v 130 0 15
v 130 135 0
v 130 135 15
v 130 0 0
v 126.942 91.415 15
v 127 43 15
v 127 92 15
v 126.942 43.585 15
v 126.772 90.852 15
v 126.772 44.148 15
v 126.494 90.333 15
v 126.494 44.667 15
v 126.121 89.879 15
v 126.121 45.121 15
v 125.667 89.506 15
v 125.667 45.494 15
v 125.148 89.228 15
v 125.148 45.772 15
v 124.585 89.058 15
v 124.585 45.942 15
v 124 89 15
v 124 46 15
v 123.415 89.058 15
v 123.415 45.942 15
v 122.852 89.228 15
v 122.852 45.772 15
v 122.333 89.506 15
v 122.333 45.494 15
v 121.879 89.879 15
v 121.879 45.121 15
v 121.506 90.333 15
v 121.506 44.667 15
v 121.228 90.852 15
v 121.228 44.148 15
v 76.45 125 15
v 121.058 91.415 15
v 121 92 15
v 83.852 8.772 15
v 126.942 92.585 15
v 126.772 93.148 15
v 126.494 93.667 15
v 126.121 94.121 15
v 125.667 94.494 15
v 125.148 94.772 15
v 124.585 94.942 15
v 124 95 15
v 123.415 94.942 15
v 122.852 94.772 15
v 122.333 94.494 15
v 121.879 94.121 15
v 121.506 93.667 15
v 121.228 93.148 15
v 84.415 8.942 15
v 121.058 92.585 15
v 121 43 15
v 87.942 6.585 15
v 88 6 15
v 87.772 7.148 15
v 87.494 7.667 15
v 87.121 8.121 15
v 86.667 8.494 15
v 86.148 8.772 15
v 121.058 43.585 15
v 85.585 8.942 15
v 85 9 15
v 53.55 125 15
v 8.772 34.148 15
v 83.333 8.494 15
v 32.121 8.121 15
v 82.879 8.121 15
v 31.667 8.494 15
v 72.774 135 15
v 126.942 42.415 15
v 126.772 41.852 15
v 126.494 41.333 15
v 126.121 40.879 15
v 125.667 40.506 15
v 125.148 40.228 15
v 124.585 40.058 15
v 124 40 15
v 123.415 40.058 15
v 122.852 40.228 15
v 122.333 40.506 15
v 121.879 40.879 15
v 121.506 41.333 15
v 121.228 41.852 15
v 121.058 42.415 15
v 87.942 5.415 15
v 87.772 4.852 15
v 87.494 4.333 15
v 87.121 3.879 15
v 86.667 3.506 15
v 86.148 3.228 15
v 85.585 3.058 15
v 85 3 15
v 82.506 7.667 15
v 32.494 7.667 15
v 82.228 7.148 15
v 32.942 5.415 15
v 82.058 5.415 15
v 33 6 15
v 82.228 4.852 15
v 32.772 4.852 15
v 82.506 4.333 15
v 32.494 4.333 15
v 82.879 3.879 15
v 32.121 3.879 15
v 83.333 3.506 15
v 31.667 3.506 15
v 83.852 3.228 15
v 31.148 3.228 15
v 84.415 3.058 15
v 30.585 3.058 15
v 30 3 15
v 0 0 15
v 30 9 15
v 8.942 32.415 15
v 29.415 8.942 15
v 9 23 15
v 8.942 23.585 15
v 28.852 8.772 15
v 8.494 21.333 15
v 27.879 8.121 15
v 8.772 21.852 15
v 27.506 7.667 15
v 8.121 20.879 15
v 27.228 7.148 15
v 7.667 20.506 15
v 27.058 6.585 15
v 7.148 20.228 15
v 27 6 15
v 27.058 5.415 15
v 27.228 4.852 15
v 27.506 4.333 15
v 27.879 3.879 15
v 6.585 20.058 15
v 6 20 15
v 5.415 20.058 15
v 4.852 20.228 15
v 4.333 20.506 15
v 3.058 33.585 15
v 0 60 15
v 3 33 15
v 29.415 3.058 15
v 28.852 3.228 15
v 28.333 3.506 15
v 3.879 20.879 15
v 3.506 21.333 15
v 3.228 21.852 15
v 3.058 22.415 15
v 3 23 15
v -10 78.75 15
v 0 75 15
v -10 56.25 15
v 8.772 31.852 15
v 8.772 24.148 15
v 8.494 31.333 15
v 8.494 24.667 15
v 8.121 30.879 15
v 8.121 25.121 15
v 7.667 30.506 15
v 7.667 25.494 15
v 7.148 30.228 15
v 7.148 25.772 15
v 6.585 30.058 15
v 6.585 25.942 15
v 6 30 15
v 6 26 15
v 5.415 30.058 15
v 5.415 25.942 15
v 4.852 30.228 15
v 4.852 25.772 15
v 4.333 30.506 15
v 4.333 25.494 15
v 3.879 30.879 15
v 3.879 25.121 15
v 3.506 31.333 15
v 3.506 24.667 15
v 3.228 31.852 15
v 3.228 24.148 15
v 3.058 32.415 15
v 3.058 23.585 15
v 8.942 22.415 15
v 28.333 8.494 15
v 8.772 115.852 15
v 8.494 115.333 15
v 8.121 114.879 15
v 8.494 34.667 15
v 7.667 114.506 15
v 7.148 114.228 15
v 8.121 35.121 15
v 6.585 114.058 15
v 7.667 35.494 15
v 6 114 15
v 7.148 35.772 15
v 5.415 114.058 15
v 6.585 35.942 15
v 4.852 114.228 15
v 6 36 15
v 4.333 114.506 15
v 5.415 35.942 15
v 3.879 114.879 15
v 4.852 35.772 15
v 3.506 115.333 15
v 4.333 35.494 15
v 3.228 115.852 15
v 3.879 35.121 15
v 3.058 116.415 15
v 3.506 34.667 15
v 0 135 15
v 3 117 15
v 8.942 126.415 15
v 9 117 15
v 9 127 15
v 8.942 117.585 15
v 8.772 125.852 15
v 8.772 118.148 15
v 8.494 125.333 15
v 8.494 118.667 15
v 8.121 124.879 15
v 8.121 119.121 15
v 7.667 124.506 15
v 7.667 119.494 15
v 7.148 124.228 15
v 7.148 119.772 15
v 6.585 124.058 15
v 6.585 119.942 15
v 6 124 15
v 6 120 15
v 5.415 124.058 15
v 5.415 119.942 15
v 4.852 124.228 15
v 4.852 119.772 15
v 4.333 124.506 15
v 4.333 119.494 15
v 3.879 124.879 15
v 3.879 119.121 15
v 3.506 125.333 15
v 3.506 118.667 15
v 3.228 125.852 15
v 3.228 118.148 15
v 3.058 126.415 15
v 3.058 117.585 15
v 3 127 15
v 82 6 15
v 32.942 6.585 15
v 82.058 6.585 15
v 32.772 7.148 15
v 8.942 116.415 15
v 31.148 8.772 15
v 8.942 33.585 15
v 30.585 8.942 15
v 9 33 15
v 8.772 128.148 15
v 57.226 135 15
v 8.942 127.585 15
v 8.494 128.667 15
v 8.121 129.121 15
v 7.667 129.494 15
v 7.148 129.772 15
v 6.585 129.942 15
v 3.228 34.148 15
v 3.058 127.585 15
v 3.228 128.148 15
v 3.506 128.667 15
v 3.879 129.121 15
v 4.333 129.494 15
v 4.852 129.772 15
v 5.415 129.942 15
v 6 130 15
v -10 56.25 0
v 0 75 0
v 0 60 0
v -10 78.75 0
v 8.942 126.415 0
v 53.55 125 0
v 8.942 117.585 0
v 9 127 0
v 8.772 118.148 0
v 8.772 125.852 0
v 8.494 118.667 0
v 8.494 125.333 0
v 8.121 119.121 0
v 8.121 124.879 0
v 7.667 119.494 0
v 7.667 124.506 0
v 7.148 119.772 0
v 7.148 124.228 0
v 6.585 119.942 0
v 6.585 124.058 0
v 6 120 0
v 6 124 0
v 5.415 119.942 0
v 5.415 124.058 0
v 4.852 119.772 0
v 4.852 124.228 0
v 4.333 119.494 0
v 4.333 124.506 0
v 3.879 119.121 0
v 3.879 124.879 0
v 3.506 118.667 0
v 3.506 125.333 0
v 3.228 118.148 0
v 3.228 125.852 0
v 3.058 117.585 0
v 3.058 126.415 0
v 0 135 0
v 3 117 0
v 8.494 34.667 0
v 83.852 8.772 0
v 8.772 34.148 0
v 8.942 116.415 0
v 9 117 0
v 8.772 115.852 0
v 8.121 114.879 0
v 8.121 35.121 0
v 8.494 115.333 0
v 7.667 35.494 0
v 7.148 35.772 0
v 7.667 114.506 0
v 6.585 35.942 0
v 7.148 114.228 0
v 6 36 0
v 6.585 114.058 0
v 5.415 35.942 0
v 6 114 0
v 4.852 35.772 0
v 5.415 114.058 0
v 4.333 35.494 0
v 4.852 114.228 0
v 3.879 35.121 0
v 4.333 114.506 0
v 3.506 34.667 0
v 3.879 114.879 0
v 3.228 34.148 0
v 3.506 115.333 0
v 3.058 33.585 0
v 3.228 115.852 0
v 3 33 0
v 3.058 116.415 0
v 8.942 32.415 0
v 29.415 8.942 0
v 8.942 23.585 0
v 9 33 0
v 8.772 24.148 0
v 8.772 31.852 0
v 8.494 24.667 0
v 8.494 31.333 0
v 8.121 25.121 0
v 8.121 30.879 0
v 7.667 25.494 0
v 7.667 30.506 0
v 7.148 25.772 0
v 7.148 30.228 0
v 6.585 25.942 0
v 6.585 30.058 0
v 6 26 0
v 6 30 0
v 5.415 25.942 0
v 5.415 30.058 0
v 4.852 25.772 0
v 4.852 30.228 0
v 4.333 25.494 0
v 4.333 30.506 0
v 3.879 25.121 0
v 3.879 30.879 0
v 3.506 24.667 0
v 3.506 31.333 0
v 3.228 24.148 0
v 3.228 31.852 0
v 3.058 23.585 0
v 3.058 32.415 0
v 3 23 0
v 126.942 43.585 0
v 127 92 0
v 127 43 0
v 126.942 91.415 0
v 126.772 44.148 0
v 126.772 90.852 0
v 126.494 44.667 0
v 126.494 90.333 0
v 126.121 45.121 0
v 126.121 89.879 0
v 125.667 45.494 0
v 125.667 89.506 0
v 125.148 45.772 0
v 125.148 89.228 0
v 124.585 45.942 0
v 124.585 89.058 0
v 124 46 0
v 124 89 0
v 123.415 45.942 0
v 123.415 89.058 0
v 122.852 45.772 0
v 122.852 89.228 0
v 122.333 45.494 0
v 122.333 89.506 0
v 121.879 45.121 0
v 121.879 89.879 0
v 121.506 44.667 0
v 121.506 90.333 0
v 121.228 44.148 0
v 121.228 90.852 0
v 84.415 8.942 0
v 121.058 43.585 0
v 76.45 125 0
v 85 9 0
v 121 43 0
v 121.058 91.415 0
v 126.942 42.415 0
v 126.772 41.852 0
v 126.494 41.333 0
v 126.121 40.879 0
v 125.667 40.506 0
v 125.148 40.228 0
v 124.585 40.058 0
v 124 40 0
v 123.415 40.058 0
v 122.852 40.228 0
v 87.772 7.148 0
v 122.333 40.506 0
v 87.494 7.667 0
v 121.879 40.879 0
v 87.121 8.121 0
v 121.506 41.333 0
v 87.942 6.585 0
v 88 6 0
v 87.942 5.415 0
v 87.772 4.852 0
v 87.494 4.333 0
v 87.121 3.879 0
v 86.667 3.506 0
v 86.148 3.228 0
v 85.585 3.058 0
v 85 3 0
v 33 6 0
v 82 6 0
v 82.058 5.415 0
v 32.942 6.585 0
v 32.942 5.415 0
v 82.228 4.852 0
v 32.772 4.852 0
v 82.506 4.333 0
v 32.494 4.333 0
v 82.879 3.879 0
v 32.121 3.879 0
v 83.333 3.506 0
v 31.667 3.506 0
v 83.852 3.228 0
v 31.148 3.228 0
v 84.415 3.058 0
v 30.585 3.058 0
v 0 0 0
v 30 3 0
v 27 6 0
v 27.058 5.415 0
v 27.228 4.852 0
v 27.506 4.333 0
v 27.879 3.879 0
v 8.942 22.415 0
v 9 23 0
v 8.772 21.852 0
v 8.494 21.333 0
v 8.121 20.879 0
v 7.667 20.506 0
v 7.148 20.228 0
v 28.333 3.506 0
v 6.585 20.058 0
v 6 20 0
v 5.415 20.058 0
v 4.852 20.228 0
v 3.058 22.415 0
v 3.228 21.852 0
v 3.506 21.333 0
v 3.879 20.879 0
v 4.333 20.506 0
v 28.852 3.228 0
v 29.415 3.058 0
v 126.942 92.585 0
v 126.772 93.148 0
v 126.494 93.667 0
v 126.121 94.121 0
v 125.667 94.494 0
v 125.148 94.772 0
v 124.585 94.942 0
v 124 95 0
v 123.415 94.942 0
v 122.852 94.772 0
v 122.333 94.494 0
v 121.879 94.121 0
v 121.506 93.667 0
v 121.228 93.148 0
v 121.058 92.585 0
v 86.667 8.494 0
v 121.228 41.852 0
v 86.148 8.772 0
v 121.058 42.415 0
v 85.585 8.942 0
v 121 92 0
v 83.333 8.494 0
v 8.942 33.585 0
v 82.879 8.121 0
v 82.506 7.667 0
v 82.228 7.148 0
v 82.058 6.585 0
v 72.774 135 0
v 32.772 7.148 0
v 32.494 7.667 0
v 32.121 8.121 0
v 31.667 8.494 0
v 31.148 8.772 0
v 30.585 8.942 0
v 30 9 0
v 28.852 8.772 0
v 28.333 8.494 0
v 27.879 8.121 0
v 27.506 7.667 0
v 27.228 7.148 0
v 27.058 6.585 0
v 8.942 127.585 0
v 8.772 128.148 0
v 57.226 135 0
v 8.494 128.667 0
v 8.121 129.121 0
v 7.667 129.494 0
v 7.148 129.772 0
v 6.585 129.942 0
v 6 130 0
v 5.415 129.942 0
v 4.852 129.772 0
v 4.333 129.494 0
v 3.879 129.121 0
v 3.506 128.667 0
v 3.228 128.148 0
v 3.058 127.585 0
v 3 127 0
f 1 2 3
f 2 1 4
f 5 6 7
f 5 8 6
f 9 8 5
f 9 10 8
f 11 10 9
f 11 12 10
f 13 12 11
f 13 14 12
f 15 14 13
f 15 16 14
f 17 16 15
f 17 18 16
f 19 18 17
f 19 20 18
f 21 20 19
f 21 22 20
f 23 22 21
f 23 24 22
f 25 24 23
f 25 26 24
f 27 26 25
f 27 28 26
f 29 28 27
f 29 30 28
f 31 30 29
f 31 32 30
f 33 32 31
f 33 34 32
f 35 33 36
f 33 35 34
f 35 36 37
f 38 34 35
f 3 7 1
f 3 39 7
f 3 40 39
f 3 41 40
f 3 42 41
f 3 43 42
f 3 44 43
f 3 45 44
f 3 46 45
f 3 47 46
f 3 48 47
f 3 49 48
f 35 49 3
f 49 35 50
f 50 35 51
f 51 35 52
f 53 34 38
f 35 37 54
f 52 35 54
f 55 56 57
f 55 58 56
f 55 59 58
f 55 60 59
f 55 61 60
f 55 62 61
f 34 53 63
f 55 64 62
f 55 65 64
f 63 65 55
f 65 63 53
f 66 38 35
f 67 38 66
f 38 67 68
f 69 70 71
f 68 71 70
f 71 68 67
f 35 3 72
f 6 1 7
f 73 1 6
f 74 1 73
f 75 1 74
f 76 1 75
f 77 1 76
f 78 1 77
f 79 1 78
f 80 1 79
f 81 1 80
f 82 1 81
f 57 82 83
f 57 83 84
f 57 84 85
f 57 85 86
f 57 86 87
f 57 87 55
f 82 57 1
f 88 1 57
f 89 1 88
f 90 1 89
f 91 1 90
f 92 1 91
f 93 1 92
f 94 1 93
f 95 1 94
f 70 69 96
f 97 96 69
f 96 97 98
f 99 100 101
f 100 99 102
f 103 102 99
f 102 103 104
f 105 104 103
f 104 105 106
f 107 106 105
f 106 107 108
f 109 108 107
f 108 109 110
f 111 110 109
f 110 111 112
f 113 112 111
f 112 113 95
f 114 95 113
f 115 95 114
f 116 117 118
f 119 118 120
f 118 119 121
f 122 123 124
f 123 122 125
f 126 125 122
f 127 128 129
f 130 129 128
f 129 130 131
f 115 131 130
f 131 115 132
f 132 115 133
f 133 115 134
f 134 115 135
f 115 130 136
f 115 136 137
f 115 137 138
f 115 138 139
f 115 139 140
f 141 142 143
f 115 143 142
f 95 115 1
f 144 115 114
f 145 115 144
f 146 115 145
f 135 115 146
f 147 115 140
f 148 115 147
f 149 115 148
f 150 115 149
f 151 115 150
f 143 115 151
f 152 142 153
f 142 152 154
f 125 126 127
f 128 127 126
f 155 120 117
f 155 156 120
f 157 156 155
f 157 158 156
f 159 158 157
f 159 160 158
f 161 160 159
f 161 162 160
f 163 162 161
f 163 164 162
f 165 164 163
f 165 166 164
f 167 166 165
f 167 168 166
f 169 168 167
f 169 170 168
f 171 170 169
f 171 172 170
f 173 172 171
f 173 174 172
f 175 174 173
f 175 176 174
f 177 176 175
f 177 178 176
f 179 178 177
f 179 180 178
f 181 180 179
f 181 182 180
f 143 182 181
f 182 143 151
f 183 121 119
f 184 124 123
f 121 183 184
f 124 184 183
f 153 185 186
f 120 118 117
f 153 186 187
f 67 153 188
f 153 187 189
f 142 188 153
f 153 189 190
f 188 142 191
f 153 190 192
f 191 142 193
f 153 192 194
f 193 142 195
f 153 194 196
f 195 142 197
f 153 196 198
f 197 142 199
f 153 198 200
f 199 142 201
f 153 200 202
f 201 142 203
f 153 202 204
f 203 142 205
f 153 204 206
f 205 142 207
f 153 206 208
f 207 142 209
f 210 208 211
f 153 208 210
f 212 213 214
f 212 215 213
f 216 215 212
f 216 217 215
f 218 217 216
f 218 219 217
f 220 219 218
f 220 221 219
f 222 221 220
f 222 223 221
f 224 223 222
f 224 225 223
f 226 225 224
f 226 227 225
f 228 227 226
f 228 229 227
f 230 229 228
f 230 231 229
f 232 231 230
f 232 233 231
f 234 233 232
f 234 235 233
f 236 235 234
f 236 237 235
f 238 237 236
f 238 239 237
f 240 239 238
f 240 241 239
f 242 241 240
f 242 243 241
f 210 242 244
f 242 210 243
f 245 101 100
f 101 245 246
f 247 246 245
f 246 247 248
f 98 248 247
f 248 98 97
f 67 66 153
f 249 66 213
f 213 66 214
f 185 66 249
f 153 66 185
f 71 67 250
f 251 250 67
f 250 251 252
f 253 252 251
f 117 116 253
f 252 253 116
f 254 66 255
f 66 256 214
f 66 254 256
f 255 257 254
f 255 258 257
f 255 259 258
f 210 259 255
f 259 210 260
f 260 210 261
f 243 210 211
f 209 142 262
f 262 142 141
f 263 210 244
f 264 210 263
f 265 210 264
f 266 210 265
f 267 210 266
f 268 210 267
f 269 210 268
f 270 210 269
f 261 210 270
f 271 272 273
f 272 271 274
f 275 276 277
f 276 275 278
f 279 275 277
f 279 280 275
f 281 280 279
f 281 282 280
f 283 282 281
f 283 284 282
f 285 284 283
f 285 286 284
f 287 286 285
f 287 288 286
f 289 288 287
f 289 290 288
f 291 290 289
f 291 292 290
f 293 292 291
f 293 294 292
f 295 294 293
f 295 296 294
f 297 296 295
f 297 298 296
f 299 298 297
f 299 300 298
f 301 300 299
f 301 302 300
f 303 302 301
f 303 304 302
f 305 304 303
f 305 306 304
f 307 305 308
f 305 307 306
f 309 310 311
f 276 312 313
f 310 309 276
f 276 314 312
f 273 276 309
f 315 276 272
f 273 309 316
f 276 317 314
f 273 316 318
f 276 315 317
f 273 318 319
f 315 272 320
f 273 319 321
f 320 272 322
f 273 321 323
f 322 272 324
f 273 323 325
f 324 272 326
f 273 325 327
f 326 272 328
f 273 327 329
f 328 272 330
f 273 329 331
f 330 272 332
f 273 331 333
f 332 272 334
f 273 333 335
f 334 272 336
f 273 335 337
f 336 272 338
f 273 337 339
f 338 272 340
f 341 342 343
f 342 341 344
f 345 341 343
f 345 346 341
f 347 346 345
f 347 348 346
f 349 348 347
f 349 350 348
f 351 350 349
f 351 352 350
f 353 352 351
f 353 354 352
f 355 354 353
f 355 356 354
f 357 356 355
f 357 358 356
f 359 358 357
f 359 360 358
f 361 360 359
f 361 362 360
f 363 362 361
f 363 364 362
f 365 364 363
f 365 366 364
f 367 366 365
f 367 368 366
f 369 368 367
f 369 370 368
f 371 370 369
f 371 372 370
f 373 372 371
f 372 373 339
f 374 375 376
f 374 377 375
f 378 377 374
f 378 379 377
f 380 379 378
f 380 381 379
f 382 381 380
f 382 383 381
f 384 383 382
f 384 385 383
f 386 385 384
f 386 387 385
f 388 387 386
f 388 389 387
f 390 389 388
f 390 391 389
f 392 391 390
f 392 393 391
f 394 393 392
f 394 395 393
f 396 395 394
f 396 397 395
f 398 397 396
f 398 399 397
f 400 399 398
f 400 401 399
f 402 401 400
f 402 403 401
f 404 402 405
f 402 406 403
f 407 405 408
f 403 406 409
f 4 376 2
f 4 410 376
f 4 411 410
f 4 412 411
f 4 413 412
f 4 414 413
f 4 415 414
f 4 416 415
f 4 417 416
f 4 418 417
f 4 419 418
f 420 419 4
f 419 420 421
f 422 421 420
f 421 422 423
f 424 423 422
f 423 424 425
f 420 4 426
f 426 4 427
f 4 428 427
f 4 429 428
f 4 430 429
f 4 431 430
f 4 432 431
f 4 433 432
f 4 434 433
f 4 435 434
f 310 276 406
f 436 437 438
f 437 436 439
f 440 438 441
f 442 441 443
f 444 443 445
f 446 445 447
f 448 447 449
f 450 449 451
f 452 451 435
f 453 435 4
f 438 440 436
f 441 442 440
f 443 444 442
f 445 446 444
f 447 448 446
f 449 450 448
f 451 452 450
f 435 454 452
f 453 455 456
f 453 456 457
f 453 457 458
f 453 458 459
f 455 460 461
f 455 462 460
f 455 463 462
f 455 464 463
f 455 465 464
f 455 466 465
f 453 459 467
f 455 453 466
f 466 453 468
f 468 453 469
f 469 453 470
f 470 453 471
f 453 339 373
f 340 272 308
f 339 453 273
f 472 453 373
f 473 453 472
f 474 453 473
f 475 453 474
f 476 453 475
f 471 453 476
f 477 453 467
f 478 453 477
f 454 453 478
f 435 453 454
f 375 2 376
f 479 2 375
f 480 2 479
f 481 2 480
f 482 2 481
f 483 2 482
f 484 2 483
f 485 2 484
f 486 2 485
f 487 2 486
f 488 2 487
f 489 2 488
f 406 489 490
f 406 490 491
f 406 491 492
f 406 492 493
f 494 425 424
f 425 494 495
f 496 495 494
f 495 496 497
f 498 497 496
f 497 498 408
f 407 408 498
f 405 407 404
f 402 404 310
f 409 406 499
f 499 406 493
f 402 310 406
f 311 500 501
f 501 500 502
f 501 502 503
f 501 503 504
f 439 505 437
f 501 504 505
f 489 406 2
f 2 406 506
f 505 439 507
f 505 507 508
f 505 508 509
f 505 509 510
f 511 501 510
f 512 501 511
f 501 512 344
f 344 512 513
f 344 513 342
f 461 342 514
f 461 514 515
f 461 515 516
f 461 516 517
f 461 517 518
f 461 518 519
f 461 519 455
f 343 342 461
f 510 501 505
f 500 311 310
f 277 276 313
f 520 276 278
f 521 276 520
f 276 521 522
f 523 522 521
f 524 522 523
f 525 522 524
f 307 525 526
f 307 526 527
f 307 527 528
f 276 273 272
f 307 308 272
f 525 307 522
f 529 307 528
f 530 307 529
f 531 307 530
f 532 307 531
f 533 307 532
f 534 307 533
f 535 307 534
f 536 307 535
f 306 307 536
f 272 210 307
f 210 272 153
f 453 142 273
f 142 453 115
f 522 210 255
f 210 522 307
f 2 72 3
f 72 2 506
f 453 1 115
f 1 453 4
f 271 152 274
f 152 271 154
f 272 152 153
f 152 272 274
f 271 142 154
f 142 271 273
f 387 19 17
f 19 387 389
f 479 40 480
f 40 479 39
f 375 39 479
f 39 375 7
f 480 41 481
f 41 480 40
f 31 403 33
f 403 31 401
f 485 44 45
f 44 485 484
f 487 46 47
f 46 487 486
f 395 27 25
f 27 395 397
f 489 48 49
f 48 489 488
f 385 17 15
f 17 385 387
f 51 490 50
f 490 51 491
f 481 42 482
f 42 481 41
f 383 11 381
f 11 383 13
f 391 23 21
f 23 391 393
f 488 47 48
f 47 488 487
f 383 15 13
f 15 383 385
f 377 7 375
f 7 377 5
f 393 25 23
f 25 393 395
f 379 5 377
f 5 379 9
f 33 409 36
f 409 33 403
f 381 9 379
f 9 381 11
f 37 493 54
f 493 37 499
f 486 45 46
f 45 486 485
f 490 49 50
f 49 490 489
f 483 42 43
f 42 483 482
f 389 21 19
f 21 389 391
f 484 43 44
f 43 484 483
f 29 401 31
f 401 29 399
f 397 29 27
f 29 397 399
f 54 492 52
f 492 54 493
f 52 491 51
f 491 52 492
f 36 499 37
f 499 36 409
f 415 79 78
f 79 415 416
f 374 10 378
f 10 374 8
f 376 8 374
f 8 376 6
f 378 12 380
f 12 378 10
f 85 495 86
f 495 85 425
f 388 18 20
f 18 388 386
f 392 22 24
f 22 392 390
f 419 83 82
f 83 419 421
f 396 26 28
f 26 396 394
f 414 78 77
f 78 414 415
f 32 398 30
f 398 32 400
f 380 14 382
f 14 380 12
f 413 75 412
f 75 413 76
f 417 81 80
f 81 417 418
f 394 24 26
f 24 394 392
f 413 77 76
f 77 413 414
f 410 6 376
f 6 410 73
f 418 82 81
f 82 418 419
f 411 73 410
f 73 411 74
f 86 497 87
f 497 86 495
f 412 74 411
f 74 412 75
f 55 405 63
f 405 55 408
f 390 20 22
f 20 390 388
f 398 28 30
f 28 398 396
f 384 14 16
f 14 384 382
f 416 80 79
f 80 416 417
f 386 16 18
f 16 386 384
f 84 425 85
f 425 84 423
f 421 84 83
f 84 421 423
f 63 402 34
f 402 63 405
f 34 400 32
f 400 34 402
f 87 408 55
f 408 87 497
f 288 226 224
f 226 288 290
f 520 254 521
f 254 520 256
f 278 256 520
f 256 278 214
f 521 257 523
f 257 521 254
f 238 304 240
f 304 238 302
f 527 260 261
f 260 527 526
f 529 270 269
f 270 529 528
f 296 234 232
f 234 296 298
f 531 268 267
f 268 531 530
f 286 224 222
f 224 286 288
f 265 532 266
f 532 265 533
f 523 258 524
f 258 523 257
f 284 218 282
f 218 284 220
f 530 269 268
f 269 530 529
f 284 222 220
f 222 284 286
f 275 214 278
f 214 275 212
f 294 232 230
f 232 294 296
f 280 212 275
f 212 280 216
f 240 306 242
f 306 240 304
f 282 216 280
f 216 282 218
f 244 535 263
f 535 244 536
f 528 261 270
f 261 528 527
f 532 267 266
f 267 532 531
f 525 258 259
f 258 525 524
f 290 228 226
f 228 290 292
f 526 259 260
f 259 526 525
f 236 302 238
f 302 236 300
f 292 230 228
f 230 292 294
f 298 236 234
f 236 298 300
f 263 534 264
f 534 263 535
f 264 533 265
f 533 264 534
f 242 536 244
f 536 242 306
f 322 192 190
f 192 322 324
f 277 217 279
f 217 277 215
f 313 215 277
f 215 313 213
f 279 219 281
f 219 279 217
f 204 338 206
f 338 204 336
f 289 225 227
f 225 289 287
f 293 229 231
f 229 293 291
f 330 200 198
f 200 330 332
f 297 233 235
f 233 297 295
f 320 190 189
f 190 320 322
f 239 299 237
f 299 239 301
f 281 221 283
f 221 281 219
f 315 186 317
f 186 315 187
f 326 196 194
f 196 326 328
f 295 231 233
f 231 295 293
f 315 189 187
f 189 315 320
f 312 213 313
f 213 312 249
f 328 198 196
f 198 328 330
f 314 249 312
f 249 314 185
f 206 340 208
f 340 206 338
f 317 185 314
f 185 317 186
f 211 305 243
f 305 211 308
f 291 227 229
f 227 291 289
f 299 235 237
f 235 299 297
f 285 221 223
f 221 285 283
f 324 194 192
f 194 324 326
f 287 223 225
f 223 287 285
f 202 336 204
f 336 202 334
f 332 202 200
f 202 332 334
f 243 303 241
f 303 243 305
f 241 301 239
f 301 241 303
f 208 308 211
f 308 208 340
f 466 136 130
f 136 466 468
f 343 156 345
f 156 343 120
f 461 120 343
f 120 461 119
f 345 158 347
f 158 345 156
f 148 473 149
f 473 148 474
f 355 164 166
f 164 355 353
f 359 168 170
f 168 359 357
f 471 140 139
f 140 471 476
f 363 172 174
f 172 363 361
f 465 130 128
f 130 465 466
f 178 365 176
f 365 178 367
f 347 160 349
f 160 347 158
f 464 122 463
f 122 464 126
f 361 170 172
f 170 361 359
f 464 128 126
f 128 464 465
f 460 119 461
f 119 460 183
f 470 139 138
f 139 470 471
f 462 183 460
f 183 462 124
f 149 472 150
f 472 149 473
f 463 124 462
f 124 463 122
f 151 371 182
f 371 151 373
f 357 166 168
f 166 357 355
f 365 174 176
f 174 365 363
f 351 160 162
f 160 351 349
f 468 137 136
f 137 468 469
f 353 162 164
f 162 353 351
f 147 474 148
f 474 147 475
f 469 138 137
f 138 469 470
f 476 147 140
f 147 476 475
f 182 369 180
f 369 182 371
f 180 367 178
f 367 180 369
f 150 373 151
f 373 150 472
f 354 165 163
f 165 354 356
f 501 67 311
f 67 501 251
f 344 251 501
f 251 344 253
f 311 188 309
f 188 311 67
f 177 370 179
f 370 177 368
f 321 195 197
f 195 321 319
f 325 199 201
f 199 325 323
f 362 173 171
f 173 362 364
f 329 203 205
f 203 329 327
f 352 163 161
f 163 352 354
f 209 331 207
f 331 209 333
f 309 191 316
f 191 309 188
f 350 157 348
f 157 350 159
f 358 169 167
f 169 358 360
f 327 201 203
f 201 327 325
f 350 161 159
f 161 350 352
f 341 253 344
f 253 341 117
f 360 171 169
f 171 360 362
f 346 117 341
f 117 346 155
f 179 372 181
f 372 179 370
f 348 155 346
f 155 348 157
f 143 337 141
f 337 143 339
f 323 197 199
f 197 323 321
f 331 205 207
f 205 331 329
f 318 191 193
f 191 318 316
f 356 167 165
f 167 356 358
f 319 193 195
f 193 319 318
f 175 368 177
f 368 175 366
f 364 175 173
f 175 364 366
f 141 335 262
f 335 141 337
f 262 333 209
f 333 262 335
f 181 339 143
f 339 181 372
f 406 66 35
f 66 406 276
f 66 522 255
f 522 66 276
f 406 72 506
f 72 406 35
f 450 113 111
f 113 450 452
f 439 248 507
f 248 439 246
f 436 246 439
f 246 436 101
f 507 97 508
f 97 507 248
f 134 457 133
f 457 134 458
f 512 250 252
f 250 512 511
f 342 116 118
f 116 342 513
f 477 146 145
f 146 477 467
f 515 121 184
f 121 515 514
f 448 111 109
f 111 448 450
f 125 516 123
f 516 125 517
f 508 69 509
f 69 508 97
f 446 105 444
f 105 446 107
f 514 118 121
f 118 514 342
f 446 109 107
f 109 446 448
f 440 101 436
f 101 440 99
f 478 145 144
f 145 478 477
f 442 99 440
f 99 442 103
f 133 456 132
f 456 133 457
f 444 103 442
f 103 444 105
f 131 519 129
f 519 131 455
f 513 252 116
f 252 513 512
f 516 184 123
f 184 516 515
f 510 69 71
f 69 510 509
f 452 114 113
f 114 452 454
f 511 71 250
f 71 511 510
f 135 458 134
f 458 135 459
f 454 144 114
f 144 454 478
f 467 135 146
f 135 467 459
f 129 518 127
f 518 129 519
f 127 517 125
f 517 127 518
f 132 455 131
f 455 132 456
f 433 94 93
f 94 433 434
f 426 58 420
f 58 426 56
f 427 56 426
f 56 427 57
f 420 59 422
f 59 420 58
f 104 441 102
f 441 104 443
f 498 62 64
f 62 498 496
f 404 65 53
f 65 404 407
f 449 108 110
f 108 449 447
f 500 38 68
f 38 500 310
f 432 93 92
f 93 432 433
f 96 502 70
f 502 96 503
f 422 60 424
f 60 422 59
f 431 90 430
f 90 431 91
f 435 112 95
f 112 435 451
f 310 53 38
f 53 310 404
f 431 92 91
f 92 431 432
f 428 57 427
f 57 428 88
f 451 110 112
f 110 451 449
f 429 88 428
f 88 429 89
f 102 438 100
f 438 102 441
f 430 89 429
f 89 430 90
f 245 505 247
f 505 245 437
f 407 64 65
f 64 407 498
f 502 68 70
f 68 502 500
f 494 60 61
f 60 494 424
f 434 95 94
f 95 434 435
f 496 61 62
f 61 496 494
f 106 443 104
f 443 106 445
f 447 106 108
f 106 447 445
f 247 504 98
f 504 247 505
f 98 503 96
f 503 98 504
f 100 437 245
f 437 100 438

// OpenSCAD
// --- PARAMETERS ---
// NOTE: All units are in mm
TILE_HEIGHT = 120;          // Interior height of each square tile
TILE_WIDTH = 100;           // Interior width of each square tile

backplate_thickness = 15;   // Thickness of backplate
wall_thickness = 15;        // Thickness of frame walls
wall_depth = 100;

div_peg_radius = 3;             // Radius of the divider pegs holes/pegs
div_height = 30;
div_peg_offset_x = (wall_thickness - 2 * div_peg_radius);           // Distance of divider pegs from the (left, right) edges
div_peg_distance = 10;          // Distance between divider peg pairs on tile
div_peg_offset_y = div_height/2 - div_peg_distance;          // Distance of divider pegs from the (top, bottom) edges


wall_peg_radius = 3;             // Radius of the wall pegs
wall_peg_offset_x = (wall_thickness - 2 * wall_peg_radius);           // Distance of wall pegs from the (left, right) edges
wall_peg_offset_y = 12;          // Distance of wall pegs from the (top, bottom) edges
wall_peg_distance = 55;          // Distance between wall peg pairs on tile

joint_width = 15;           // Width of the interlocking dovetail
joint_depth = 10;           // Depth of the interlocking joint
tolerance = 0.2;            // Tolerance for printing

/* [Piece Selector] */
// Options: "center", "top_left", "top_mid", "top_right", "mid_left", "mid_right", "bot_left", "bot_mid", "bot_right"
// Order of options below is IMPORTANT
// Note: This generates all the modular pieces for the mug shelf. There should be no need to modify the tile options matrix as all parts with exception of corners are designed to be infinitely tile-able to fit the desired dimension requirements.
TILE_OPTIONS = ["top_left", "top_mid", "top_right", 
                "mid_left", "center", "mid_right", 
                "bot_left", "bot_mid", "bot_right"];
tile_type = "bot_right";
tile_index = search([tile_type], TILE_OPTIONS);

module dovetail_male(is_socket = false) {
    t_adj = is_socket ? tolerance : 0;
    linear_extrude(backplate_thickness + (is_socket ? 2 : 0))
    polygon([
            [0, -t_adj], 
            [joint_depth + t_adj, -joint_width/4 - t_adj], 
            [joint_depth + t_adj, joint_width*1.25 + t_adj], 
            [0, joint_width + t_adj]]);
}

module tile_generator() {
    // Adjust tile dimensions depending on option to keep interior space consistent
    // Increase height for top and bottom rows, NOTE: top row should be the largest as it contains both a top and bottom wall
    tile_height = TILE_HEIGHT + (tile_index[0] < 3 ? 2 : 1) * wall_thickness;
    // Increase width for leftmost and rightmost columns
    tile_width = TILE_WIDTH + (tile_index[0] % 3 == 2 ? 2 : 1) * wall_thickness;
    
    difference () {
        union(){
            cube([tile_width, tile_height, backplate_thickness]);
            // Add Male Joints (Left and Bottom for logic)
            // Left joint (mid, right)
            if (tile_index[0] % 3 > 0) {
                 translate([0, tile_height/2 + joint_width/2, 0]) rotate([0,0,180]) dovetail_male();
            }
            
            // Bottom joint (top, mid)
            if (tile_index[0] < 6) {    
                 // Bottom
                 translate([tile_width/2 - joint_width/2, 0, 0]) rotate([0,0,-90]) dovetail_male();
            }
        }
        
        // Subtract Female Joints (Right and Top for logic)
        // Right joint (left, mid)
        if (tile_index[0] % 3 < 2) {
                 translate([tile_width + tolerance, tile_height/2 + joint_width/2, -1]) rotate([0,0,180]) dovetail_male(true);
        }
        
        // Troubleshooting hole distances
        // Divider bottom
        //translate([0, wall_thickness, 0]) cube([wall_thickness, div_height, backplate_thickness + 2]);
        // Divider top
        //translate([0, tile_height - div_height - (tile_index[0] < 3 ? 1 : 0) * wall_thickness, 0]) cube([wall_thickness, div_height, backplate_thickness + 2]);
        // Wall bottom
        //cube([tile_width, wall_thickness, backplate_thickness + 2]);
        // Wall top
        //translate([0, tile_height - (tile_index[0] < 3 ? 1 : 0) * wall_thickness, 0]) cube([tile_width, wall_thickness, backplate_thickness + 2]);
        // Wall left
        //cube([wall_thickness, tile_height, backplate_thickness + 2]);
        // Interior
        //translate([wall_thickness, wall_thickness, 0]) cube([TILE_WIDTH, TILE_HEIGHT, backplate_thickness + 2]);
        
        // Top joint (mid, bottom)
        if (tile_index[0] > 2) {
                 translate([tile_width/2 - joint_width/2, tile_height + tolerance, -1]) rotate([0,0,-90]) dovetail_male(true);
        }
        
        // Subtract Pegholes
        // Frame Top (top) we swap the offset x and y values here
        if (tile_index[0] < 3) {
            // (tile_index[0] % 3) -> [0,1,2] shift the whole thing down by -1, then we can apply adjustment for additional wall thickness while keeping pegs centered
            translate([tile_width/2 - wall_peg_distance/2 - (((tile_index[0] % 3) - 1) * wall_thickness)/2, tile_height - wall_peg_offset_x + wall_peg_radius, -1]) cylinder(r=wall_peg_radius, h=backplate_thickness+2, $fn=32);
            translate([tile_width/2 + wall_peg_distance/2 - (((tile_index[0] % 3) - 1) * wall_thickness)/2, tile_height - wall_peg_offset_x + wall_peg_radius, -1]) cylinder(r=wall_peg_radius, h=backplate_thickness+2, $fn=32);
        }
        // Frame Left (left)
        if (tile_index[0] % 3 == 0) {
            translate([wall_peg_offset_x - wall_peg_radius, tile_height/2 + wall_peg_distance/2 - wall_peg_radius, -1]) cylinder(r=div_peg_radius, h=backplate_thickness+2, $fn=32);
            translate([wall_peg_offset_x - wall_peg_radius, tile_height/2 - wall_peg_distance/2 + wall_peg_radius, -1]) cylinder(r=div_peg_radius, h=backplate_thickness+2, $fn=32);
        }
        // Frame Right (right)
        if (tile_index[0] % 3 == 2) {
            translate([tile_width - wall_peg_offset_x + wall_peg_radius, tile_height/2 + wall_peg_distance/2 - wall_peg_radius, -1]) cylinder(r=div_peg_radius, h=backplate_thickness+2, $fn=32);
            translate([tile_width - wall_peg_offset_x + wall_peg_radius, tile_height/2 - wall_peg_distance/2 + wall_peg_radius, -1]) cylinder(r=div_peg_radius, h=backplate_thickness+2, $fn=32);
        }
        // Frame Bottom (all tiles) we swap the offset x and y values here
        translate([tile_width/2 - wall_peg_distance/2 - (((tile_index[0] % 3) - 1) * wall_thickness)/2, wall_peg_offset_x - wall_peg_radius, -1]) cylinder(r=wall_peg_radius, h=backplate_thickness+2, $fn=32);
        translate([tile_width/2 + wall_peg_distance/2 - (((tile_index[0] % 3) - 1) * wall_thickness)/2, wall_peg_offset_x - wall_peg_radius, -1]) cylinder(r=wall_peg_radius, h=backplate_thickness+2, $fn=32);
        // Dividers (mid, right)
        if (tile_index[0] % 3 > 0) {
            // (floor(tile_index[0] / 3)) -> [0,1,2] shift the whole thing down by -1, then we can apply adjustment for additional wall thickness while keeping pegs centered
            // Top pair
            translate([div_peg_offset_x - div_peg_radius, tile_height - div_peg_offset_y - div_peg_radius - (tile_index[0] < 3 ? 2 : 0) * wall_thickness/2, -1]) cylinder(r=div_peg_radius, h=backplate_thickness+2, $fn=32);
            translate([div_peg_offset_x - div_peg_radius, tile_height - div_peg_offset_y - div_peg_distance - div_peg_radius - (tile_index[0] < 3 ? 2 : 0) * wall_thickness/2, -1]) cylinder(r=div_peg_radius, h=backplate_thickness+2, $fn=32);
            
            // Bottom pair
            translate([div_peg_offset_x - div_peg_radius, div_peg_offset_y + div_peg_radius + 
            wall_thickness, -1]) cylinder(r=div_peg_radius, h=backplate_thickness+2, $fn=32);
            translate([div_peg_offset_x - div_peg_radius, div_peg_offset_y + div_peg_distance + div_peg_radius + wall_thickness, -1]) cylinder(r=div_peg_radius, h=backplate_thickness+2, $fn=32);
        }
    }
}

tile_generator();
